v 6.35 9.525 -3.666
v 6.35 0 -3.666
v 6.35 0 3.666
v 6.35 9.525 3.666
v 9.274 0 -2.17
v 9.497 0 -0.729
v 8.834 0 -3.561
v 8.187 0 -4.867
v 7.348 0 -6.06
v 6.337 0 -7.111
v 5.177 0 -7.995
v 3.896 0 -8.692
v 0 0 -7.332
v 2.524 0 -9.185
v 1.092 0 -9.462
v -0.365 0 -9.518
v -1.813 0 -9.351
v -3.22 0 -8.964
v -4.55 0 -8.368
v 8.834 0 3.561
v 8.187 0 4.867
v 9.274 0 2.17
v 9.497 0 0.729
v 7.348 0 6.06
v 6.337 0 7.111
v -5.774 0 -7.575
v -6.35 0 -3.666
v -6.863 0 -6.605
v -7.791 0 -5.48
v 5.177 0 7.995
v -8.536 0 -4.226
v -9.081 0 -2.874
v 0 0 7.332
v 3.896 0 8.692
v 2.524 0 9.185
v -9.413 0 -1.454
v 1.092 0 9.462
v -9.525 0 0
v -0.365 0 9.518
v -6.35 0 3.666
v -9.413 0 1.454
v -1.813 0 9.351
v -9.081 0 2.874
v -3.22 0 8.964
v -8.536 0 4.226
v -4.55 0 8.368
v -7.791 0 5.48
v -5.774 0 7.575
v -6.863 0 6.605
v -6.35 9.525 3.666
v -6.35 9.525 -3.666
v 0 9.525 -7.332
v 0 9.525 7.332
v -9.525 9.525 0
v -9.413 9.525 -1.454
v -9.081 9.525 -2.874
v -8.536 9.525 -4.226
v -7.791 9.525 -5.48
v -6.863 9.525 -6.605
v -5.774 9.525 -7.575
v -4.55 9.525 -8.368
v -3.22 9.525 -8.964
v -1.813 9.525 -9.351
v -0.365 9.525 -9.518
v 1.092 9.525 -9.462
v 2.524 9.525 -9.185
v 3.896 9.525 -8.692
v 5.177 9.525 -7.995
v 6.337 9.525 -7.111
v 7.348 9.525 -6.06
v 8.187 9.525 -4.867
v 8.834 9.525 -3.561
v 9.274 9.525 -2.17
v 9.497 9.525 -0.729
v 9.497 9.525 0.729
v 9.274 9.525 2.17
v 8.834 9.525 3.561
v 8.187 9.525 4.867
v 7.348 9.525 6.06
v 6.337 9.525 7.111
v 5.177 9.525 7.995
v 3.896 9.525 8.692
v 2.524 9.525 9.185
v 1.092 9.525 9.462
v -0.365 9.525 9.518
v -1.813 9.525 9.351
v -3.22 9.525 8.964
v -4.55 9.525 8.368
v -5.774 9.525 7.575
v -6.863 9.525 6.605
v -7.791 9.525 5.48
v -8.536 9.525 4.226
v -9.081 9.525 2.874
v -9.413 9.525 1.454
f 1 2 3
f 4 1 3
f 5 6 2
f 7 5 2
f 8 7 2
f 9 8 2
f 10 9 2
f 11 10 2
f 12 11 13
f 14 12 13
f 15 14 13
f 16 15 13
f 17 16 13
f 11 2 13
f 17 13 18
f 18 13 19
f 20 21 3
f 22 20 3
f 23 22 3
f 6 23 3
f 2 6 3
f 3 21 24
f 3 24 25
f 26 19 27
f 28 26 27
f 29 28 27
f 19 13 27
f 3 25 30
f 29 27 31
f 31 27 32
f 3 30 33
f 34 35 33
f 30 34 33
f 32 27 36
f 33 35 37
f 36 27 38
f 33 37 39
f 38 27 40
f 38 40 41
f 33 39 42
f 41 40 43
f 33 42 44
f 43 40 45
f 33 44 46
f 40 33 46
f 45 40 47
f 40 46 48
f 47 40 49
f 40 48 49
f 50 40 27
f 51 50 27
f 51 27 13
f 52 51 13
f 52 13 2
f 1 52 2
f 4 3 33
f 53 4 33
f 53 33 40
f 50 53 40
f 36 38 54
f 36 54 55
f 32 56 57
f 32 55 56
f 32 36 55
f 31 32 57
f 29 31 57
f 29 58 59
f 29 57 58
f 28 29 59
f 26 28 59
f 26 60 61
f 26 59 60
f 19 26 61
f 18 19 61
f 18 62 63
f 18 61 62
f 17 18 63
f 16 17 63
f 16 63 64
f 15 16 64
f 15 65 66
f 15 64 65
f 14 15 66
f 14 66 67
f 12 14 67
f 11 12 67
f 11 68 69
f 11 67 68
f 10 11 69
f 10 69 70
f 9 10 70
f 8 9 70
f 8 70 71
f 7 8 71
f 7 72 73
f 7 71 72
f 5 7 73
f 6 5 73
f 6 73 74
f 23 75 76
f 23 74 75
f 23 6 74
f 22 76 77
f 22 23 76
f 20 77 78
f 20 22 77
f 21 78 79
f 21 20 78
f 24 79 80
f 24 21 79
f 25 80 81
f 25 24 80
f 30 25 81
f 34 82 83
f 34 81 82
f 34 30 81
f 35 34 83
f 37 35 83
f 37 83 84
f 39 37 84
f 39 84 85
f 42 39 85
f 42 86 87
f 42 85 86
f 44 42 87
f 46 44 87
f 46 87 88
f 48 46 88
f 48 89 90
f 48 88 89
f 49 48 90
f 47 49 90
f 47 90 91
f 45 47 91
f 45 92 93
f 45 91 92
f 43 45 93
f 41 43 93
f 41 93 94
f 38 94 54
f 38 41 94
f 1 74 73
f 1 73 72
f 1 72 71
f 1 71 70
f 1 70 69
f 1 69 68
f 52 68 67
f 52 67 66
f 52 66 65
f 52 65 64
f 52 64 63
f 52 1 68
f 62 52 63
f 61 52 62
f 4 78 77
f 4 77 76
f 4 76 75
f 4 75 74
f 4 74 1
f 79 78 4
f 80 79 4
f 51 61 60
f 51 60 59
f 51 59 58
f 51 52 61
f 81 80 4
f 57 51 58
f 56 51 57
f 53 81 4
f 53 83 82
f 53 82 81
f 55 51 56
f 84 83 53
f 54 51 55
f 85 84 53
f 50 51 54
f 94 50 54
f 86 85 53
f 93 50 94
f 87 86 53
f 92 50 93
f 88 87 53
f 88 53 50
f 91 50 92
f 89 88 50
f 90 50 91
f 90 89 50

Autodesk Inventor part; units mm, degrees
ref_plane "YZ Plane" through (0, 0, 0) normal (1, 0, 0) x (0, 1, 0)
ref_plane "XZ Plane" through (0, 0, 0) normal (0, 1, 0) x (-1, 0, 0)
ref_plane "XY Plane" through (0, 0, 0) normal (0, 0, 1) x (1, 0, 0)
sketch "Sketch1" plane through (0, 0, 0) normal (0, 1, 0) x (-1, 0, 0)
  circle A0 centre (0, 0) radius 6.35 construction
  line L0 (6.35, -3.6662) -> (0, -7.3323)
  line L1 (0, -7.3323) -> (-6.35, -3.6662)
  line L2 (-6.35, -3.6662) -> (-6.35, 3.6662)
  line L3 (-6.35, 3.6662) -> (0, 7.3323)
  line L4 (0, 7.3323) -> (6.35, 3.6662)
  line L5 (6.35, 3.6662) -> (6.35, -3.6662)
  circle A1 centre (0, 0) radius 9.525
  point P0 (6.35, 0)
  dimension "d0" = 12.7
  dimension "d1" = 19.05
extrude "Extrusion1" add sketch "Sketch1" along normal blind 9.525
properties part number "SportGearbox_HexDiffGearSpacer"
